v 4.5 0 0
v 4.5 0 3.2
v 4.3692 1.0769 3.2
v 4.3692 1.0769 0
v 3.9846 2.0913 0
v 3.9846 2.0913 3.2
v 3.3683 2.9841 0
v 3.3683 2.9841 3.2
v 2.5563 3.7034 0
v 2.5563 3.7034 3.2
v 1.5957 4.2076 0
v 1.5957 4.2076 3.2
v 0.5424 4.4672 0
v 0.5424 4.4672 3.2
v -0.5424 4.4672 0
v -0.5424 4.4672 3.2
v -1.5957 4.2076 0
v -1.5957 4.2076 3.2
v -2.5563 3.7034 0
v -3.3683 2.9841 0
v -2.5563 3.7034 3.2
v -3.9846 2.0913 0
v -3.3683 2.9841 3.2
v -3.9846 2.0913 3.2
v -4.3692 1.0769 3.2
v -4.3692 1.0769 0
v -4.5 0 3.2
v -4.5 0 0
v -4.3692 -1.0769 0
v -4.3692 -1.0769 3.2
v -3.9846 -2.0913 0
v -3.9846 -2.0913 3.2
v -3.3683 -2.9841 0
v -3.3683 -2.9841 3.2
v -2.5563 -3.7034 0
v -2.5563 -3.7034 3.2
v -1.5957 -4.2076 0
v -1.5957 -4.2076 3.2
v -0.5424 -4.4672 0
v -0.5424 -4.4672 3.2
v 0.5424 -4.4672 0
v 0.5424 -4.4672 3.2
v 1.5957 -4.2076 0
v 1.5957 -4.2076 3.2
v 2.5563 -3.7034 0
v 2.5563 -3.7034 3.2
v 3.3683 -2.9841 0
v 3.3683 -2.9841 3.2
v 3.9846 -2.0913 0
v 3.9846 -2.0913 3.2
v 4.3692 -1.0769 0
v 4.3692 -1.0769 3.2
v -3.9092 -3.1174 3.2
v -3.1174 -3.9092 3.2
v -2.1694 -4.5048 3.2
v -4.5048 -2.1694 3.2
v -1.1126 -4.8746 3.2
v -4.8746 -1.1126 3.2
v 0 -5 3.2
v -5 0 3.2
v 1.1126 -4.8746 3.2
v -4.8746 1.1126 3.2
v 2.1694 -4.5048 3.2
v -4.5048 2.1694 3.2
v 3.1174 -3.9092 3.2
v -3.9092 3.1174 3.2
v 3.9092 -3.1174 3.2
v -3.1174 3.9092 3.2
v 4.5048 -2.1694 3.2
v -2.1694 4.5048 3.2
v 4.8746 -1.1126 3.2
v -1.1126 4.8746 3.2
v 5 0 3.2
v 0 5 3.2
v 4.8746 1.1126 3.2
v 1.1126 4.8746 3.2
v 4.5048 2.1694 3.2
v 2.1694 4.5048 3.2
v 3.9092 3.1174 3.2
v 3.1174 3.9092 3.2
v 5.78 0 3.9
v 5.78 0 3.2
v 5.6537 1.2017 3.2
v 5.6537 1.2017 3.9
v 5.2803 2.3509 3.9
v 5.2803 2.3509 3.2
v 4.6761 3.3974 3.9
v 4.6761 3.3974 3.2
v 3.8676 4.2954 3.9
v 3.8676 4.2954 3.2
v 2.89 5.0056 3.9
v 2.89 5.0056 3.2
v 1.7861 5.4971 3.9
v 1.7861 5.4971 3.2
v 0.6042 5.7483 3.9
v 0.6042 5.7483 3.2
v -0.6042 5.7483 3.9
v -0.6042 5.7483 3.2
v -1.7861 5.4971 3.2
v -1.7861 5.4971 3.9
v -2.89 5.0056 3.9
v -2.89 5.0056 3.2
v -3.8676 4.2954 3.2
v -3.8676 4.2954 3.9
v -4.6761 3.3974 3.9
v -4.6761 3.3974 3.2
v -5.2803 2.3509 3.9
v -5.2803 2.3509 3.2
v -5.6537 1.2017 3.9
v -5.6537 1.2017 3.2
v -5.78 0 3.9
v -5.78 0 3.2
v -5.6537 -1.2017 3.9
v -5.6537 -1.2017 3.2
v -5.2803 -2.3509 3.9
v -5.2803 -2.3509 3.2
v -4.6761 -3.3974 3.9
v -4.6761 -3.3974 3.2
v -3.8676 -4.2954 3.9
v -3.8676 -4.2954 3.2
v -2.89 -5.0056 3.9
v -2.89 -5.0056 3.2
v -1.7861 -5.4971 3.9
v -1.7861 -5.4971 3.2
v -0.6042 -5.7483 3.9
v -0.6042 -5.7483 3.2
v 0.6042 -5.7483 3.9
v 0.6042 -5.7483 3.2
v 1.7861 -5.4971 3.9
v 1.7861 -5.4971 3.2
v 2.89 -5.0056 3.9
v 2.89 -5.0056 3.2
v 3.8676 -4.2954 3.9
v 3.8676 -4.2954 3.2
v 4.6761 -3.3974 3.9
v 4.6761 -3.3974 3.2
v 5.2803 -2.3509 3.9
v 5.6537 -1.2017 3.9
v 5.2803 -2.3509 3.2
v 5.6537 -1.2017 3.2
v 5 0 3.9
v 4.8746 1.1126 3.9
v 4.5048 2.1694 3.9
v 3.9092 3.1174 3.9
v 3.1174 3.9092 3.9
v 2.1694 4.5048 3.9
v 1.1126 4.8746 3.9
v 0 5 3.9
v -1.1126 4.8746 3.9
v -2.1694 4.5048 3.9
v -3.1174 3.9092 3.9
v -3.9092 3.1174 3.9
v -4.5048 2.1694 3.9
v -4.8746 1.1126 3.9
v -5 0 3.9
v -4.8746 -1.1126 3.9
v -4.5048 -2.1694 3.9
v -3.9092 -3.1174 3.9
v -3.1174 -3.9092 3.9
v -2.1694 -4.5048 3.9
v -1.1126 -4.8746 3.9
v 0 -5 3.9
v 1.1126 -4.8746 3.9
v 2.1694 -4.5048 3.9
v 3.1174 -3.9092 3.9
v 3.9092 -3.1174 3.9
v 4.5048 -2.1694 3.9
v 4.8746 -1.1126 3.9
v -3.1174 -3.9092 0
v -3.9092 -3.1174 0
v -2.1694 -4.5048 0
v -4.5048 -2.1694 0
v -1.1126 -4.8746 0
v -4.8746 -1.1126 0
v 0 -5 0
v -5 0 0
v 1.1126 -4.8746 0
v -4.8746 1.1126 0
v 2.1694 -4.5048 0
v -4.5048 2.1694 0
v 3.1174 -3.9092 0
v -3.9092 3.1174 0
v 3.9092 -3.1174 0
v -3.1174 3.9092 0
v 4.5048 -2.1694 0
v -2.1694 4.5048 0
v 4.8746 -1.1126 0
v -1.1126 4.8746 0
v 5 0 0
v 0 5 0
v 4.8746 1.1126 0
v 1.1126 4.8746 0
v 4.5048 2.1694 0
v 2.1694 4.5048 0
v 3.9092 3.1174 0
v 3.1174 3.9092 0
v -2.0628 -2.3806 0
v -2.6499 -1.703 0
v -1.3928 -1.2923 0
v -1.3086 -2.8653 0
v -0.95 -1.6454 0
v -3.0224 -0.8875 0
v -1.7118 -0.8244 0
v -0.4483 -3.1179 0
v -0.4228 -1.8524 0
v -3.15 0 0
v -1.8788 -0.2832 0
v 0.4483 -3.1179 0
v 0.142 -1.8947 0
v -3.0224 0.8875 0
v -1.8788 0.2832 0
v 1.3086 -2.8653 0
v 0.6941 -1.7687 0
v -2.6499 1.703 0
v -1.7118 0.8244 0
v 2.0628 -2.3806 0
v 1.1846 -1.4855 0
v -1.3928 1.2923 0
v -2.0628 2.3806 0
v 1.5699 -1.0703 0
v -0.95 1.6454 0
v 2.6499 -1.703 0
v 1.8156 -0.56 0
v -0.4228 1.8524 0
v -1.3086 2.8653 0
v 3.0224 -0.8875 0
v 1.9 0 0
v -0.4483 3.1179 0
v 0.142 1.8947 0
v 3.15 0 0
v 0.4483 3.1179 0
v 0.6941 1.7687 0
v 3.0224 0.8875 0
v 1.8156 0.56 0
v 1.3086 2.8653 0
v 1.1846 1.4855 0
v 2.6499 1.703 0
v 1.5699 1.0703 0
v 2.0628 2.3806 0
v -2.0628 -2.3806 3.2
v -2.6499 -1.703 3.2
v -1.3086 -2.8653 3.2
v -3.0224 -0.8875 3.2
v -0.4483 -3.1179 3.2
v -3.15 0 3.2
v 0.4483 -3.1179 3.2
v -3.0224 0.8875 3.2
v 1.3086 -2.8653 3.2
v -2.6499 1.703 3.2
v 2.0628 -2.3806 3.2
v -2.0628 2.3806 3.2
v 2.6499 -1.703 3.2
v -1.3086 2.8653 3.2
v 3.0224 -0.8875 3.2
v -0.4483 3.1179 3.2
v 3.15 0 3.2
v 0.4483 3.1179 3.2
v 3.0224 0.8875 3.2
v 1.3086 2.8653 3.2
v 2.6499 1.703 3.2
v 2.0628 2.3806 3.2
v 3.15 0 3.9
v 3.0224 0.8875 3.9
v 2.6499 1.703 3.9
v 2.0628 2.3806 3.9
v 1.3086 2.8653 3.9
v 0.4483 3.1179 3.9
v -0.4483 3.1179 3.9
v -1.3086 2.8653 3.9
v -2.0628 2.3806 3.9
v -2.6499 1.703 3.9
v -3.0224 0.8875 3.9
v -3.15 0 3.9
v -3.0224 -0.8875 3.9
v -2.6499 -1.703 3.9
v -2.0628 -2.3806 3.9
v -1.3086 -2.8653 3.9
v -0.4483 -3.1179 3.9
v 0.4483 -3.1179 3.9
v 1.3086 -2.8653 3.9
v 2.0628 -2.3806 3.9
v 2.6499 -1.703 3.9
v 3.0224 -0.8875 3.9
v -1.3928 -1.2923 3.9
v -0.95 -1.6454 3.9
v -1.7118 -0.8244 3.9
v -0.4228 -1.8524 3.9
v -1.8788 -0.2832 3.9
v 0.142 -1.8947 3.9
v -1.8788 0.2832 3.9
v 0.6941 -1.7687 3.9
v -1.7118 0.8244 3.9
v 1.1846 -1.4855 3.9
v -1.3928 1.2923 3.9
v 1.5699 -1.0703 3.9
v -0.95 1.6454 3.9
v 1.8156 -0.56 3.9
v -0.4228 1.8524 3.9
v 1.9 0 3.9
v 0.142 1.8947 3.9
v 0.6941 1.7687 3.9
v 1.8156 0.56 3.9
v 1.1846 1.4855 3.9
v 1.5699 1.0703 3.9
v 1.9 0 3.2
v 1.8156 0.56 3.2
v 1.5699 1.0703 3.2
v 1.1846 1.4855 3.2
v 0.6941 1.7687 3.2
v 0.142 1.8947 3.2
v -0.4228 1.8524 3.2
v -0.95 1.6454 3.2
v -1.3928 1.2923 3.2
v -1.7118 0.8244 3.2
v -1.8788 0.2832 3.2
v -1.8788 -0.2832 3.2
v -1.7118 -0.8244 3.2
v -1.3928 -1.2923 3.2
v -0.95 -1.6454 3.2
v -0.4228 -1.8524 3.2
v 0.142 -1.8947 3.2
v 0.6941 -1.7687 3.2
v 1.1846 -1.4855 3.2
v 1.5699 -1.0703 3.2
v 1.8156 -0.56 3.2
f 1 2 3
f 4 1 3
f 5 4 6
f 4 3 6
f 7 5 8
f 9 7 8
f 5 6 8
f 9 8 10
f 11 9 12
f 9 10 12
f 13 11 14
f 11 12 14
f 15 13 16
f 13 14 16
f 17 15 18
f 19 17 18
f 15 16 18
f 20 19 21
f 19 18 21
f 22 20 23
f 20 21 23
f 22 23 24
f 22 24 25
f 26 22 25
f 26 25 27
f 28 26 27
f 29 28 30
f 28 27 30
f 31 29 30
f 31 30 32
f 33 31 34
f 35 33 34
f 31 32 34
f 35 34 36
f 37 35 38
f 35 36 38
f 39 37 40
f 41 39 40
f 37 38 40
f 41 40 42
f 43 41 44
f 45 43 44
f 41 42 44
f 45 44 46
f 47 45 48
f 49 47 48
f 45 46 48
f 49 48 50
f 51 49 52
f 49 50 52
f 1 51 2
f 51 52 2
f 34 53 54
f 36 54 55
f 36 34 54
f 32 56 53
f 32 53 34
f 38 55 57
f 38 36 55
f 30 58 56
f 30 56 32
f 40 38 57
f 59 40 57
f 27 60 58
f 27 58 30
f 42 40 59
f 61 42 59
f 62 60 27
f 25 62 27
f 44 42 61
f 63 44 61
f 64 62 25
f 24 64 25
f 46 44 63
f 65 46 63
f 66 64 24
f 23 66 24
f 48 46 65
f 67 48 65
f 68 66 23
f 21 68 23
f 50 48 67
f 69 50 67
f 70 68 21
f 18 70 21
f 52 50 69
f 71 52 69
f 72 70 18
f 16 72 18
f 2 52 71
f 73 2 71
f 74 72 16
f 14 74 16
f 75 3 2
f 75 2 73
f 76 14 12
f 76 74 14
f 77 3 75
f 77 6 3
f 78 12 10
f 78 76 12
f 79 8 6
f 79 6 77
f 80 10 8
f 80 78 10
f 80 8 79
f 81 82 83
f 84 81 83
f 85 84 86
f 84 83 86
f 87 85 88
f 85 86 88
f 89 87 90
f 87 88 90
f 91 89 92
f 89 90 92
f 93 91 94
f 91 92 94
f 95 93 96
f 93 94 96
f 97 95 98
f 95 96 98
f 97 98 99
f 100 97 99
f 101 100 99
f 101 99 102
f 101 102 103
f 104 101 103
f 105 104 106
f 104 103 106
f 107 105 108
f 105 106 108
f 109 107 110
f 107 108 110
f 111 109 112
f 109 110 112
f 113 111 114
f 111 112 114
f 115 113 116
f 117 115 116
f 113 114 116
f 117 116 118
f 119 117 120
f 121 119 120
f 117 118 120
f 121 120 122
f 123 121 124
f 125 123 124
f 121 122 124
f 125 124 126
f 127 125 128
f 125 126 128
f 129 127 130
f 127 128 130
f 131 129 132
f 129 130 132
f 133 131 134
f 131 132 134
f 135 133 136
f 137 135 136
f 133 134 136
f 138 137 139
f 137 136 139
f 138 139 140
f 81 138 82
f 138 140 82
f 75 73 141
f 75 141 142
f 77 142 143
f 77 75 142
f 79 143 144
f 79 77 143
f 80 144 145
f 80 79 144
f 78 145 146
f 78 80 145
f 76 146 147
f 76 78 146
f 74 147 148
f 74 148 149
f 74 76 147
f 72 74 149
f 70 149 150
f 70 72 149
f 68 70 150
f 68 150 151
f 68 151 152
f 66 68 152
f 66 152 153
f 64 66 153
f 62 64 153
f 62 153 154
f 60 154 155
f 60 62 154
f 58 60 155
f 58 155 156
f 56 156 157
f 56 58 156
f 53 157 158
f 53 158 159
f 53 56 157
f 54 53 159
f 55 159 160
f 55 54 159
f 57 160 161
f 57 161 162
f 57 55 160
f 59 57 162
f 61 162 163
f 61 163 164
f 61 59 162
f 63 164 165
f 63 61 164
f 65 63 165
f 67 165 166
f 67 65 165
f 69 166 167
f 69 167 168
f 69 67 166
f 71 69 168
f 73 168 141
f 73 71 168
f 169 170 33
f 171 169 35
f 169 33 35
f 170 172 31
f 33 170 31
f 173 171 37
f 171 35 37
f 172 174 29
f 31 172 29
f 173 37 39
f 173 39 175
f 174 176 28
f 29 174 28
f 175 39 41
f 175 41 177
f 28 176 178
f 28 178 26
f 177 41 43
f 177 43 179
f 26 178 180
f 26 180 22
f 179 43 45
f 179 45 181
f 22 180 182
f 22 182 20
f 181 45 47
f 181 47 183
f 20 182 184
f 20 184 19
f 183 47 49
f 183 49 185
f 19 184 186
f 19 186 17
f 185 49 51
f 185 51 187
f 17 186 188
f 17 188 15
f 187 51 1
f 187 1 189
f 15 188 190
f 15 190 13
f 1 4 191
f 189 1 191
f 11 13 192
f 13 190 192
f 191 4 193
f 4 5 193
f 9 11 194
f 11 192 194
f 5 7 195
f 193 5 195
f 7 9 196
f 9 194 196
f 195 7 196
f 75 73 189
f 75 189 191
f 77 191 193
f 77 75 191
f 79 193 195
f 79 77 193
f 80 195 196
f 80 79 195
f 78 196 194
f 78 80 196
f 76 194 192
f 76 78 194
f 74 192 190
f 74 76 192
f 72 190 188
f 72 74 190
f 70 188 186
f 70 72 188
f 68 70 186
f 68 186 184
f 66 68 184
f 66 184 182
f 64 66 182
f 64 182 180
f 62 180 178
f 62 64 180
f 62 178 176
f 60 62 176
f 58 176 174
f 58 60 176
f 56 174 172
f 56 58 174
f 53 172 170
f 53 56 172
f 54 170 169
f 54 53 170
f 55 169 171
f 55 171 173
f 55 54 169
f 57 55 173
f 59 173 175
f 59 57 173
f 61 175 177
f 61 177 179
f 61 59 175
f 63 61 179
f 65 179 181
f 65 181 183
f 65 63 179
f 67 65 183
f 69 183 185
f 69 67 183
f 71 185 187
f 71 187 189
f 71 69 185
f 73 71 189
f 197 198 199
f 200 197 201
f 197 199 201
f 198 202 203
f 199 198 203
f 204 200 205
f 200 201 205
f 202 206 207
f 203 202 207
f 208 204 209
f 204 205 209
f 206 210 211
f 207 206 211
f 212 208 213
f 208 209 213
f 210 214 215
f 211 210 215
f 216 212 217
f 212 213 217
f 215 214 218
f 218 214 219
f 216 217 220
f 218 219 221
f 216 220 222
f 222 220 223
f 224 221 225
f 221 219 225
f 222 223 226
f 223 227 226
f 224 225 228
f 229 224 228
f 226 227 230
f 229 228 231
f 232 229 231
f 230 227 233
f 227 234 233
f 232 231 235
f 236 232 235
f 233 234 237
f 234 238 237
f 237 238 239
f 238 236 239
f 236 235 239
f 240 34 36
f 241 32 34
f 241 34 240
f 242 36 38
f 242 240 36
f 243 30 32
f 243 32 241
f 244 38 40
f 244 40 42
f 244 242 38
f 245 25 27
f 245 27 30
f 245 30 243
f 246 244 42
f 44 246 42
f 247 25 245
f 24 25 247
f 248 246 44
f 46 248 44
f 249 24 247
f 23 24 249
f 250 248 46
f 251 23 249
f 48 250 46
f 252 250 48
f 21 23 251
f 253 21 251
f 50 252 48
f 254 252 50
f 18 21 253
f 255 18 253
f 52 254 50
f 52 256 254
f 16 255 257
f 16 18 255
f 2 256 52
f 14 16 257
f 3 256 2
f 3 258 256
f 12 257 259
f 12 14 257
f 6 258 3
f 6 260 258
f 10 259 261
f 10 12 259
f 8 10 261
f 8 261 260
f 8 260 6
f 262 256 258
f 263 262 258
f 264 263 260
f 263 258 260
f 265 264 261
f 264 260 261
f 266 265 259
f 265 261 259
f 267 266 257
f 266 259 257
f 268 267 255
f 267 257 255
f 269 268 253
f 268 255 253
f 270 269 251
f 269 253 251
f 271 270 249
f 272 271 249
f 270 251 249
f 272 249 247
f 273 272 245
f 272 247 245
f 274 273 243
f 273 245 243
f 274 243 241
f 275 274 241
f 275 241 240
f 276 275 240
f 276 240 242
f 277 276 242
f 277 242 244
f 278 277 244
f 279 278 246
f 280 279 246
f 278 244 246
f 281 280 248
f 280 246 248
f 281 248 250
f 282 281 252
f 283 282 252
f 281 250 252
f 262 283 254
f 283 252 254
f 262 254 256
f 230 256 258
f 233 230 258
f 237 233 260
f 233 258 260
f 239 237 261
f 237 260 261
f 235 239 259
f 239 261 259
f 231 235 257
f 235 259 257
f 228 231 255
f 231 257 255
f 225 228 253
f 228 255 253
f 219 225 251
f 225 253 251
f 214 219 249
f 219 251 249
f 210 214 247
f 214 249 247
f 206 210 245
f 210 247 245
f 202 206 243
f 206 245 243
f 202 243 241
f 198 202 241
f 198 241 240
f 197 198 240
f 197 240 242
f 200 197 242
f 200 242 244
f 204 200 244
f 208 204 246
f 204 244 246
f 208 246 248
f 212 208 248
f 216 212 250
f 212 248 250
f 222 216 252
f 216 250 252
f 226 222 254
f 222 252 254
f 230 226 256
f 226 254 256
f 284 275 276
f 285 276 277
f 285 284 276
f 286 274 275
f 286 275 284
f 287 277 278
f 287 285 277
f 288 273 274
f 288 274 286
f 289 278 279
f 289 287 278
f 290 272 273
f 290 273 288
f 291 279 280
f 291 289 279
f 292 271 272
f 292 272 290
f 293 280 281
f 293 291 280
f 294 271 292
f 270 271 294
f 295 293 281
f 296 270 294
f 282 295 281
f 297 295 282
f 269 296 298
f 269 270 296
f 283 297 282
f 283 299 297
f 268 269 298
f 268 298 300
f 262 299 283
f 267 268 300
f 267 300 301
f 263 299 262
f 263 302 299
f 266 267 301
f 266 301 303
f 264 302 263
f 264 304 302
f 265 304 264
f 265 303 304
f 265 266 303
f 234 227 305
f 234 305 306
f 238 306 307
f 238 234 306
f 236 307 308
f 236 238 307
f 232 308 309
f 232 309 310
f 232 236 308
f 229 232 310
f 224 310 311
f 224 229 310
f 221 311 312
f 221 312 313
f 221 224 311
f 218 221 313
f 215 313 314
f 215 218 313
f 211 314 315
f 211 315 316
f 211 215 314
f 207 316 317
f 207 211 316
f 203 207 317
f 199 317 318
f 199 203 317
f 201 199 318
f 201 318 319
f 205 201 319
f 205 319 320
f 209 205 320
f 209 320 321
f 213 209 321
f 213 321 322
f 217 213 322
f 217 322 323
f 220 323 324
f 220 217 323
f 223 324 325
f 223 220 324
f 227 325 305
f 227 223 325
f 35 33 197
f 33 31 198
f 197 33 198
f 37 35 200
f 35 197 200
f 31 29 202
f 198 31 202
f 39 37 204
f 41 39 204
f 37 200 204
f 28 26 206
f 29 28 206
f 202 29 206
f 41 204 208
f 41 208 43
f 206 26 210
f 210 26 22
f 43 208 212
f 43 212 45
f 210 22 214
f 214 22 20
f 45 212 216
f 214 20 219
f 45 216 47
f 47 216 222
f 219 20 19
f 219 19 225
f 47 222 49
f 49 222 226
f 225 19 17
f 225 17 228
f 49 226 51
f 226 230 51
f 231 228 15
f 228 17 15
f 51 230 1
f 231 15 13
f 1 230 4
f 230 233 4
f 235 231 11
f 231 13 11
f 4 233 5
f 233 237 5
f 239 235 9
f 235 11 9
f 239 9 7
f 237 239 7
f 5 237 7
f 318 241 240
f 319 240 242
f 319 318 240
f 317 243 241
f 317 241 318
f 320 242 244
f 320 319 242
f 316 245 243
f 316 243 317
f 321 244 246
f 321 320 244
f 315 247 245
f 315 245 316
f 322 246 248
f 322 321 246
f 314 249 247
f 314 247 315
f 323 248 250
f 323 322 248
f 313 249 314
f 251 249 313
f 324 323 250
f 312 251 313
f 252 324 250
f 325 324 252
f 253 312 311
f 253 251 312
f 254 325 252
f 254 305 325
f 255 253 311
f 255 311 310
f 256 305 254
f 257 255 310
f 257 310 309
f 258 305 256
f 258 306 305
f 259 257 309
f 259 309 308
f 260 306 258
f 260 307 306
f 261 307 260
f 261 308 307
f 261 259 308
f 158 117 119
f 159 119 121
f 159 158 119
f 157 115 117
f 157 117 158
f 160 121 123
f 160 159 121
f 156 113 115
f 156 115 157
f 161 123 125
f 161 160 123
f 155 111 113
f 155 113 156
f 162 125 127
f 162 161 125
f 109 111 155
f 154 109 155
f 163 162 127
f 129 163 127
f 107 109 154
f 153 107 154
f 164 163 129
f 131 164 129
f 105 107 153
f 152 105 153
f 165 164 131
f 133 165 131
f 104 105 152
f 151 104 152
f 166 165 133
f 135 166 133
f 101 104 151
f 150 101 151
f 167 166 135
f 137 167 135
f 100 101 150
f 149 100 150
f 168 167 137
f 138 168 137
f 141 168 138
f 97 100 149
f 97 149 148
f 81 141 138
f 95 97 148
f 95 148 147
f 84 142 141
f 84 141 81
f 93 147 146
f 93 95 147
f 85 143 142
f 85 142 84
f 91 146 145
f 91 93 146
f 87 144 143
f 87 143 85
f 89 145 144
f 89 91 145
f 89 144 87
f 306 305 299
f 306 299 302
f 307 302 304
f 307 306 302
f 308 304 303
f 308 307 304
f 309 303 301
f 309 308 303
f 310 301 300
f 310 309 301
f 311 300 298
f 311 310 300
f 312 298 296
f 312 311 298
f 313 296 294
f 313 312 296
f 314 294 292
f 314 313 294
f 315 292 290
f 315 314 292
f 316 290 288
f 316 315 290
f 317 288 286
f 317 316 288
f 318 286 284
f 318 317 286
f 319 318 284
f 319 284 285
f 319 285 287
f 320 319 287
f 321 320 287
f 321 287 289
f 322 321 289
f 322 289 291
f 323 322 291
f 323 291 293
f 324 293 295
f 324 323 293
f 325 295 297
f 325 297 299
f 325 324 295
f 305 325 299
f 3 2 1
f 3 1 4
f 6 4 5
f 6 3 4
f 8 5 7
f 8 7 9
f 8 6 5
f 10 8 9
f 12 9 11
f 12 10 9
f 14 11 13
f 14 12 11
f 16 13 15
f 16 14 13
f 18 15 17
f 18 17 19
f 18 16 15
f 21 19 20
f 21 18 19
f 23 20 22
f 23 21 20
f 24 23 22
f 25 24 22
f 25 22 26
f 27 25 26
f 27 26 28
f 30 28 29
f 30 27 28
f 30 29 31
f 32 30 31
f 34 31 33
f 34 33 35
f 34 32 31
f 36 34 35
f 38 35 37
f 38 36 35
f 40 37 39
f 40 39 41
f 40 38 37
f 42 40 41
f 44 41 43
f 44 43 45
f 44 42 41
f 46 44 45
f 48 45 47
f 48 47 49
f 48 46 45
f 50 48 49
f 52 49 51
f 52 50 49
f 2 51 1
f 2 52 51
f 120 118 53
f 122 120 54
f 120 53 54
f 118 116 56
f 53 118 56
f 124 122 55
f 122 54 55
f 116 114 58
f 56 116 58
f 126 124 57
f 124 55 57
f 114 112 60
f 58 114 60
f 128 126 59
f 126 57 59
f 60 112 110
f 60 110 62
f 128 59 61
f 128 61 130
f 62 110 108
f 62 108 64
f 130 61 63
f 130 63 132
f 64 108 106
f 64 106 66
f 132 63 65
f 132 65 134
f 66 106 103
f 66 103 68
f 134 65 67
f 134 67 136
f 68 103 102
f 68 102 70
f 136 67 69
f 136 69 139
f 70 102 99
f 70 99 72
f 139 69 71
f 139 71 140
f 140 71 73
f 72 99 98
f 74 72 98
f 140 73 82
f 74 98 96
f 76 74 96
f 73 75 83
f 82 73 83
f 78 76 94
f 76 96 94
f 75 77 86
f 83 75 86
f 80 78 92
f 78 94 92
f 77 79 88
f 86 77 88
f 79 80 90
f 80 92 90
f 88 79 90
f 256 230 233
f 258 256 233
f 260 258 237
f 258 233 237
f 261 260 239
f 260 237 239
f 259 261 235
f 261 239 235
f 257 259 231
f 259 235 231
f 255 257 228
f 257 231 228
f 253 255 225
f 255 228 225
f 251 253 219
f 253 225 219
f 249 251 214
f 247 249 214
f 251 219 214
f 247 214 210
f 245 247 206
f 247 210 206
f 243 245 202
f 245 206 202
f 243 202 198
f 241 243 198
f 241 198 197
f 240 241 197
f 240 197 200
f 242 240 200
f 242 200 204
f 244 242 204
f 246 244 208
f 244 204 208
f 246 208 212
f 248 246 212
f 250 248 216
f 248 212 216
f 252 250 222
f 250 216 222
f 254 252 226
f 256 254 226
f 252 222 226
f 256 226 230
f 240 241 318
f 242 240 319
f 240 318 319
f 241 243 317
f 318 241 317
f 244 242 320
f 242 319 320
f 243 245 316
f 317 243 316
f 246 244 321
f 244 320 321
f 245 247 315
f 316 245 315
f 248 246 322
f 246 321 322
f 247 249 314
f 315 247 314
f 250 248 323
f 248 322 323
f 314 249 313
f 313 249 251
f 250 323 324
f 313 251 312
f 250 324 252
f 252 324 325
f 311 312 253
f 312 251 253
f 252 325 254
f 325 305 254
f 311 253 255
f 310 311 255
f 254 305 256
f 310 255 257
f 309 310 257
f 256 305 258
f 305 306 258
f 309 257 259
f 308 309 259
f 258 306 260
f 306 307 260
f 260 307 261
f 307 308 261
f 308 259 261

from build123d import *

# Parameters (mm, degrees)
SKETCH_1_R      = 3.15
SKETCH_1_R_2    = 1.9
EXTRUDE_1_DEPTH = 3.2
SKETCH_2_R      = 5
SKETCH_2_R_2    = 4.5
EXTRUDE_2_DEPTH = 3.2
SKETCH_3_R      = 4.5
SKETCH_3_R_2    = 3.15
EXTRUDE_4_DEPTH = 3.2
SKETCH_4_R      = 5.78
SKETCH_4_R_2    = 5
EXTRUDE_6_DEPTH = 0.7
SKETCH_5_R      = 3.15
SKETCH_5_R_2    = 1.9
EXTRUDE_7_DEPTH = 0.7


with BuildPart() as part:
    # 草图1 → 凸台-拉伸1 (new body)
    with BuildSketch(Plane.XY):
        Circle(SKETCH_1_R)
        Circle(SKETCH_1_R_2, mode=Mode.SUBTRACT)
    extrude(amount=EXTRUDE_1_DEPTH)


with BuildPart() as body_2:
    # 草图2 → 凸台-拉伸2 (new body)
    with BuildSketch(Plane.XY.offset(3.2)):
        Circle(SKETCH_2_R)
        Circle(SKETCH_2_R_2, mode=Mode.SUBTRACT)
    extrude(amount=-EXTRUDE_2_DEPTH)


with BuildPart() as body_3:
    # 草图3 → 凸台-拉伸4 (new body)
    with BuildSketch(Plane.XY.offset(3.2)):
        Circle(SKETCH_3_R)
        Circle(SKETCH_3_R_2, mode=Mode.SUBTRACT)
    extrude(amount=-EXTRUDE_4_DEPTH)


with BuildPart() as body_4:
    # 草图4 → 凸台-拉伸6 (new body)
    with BuildSketch(Plane.XY.offset(3.2)):
        Circle(SKETCH_4_R)
        Circle(SKETCH_4_R_2, mode=Mode.SUBTRACT)
    extrude(amount=EXTRUDE_6_DEPTH)


with BuildPart() as body_5:
    # 草图5 → 凸台-拉伸7 (new body)
    with BuildSketch(Plane.XY.offset(3.2)):
        Circle(SKETCH_5_R)
        Circle(SKETCH_5_R_2, mode=Mode.SUBTRACT)
    extrude(amount=EXTRUDE_7_DEPTH)


solid = Compound([part.part, body_2.part, body_3.part, body_4.part, body_5.part])
